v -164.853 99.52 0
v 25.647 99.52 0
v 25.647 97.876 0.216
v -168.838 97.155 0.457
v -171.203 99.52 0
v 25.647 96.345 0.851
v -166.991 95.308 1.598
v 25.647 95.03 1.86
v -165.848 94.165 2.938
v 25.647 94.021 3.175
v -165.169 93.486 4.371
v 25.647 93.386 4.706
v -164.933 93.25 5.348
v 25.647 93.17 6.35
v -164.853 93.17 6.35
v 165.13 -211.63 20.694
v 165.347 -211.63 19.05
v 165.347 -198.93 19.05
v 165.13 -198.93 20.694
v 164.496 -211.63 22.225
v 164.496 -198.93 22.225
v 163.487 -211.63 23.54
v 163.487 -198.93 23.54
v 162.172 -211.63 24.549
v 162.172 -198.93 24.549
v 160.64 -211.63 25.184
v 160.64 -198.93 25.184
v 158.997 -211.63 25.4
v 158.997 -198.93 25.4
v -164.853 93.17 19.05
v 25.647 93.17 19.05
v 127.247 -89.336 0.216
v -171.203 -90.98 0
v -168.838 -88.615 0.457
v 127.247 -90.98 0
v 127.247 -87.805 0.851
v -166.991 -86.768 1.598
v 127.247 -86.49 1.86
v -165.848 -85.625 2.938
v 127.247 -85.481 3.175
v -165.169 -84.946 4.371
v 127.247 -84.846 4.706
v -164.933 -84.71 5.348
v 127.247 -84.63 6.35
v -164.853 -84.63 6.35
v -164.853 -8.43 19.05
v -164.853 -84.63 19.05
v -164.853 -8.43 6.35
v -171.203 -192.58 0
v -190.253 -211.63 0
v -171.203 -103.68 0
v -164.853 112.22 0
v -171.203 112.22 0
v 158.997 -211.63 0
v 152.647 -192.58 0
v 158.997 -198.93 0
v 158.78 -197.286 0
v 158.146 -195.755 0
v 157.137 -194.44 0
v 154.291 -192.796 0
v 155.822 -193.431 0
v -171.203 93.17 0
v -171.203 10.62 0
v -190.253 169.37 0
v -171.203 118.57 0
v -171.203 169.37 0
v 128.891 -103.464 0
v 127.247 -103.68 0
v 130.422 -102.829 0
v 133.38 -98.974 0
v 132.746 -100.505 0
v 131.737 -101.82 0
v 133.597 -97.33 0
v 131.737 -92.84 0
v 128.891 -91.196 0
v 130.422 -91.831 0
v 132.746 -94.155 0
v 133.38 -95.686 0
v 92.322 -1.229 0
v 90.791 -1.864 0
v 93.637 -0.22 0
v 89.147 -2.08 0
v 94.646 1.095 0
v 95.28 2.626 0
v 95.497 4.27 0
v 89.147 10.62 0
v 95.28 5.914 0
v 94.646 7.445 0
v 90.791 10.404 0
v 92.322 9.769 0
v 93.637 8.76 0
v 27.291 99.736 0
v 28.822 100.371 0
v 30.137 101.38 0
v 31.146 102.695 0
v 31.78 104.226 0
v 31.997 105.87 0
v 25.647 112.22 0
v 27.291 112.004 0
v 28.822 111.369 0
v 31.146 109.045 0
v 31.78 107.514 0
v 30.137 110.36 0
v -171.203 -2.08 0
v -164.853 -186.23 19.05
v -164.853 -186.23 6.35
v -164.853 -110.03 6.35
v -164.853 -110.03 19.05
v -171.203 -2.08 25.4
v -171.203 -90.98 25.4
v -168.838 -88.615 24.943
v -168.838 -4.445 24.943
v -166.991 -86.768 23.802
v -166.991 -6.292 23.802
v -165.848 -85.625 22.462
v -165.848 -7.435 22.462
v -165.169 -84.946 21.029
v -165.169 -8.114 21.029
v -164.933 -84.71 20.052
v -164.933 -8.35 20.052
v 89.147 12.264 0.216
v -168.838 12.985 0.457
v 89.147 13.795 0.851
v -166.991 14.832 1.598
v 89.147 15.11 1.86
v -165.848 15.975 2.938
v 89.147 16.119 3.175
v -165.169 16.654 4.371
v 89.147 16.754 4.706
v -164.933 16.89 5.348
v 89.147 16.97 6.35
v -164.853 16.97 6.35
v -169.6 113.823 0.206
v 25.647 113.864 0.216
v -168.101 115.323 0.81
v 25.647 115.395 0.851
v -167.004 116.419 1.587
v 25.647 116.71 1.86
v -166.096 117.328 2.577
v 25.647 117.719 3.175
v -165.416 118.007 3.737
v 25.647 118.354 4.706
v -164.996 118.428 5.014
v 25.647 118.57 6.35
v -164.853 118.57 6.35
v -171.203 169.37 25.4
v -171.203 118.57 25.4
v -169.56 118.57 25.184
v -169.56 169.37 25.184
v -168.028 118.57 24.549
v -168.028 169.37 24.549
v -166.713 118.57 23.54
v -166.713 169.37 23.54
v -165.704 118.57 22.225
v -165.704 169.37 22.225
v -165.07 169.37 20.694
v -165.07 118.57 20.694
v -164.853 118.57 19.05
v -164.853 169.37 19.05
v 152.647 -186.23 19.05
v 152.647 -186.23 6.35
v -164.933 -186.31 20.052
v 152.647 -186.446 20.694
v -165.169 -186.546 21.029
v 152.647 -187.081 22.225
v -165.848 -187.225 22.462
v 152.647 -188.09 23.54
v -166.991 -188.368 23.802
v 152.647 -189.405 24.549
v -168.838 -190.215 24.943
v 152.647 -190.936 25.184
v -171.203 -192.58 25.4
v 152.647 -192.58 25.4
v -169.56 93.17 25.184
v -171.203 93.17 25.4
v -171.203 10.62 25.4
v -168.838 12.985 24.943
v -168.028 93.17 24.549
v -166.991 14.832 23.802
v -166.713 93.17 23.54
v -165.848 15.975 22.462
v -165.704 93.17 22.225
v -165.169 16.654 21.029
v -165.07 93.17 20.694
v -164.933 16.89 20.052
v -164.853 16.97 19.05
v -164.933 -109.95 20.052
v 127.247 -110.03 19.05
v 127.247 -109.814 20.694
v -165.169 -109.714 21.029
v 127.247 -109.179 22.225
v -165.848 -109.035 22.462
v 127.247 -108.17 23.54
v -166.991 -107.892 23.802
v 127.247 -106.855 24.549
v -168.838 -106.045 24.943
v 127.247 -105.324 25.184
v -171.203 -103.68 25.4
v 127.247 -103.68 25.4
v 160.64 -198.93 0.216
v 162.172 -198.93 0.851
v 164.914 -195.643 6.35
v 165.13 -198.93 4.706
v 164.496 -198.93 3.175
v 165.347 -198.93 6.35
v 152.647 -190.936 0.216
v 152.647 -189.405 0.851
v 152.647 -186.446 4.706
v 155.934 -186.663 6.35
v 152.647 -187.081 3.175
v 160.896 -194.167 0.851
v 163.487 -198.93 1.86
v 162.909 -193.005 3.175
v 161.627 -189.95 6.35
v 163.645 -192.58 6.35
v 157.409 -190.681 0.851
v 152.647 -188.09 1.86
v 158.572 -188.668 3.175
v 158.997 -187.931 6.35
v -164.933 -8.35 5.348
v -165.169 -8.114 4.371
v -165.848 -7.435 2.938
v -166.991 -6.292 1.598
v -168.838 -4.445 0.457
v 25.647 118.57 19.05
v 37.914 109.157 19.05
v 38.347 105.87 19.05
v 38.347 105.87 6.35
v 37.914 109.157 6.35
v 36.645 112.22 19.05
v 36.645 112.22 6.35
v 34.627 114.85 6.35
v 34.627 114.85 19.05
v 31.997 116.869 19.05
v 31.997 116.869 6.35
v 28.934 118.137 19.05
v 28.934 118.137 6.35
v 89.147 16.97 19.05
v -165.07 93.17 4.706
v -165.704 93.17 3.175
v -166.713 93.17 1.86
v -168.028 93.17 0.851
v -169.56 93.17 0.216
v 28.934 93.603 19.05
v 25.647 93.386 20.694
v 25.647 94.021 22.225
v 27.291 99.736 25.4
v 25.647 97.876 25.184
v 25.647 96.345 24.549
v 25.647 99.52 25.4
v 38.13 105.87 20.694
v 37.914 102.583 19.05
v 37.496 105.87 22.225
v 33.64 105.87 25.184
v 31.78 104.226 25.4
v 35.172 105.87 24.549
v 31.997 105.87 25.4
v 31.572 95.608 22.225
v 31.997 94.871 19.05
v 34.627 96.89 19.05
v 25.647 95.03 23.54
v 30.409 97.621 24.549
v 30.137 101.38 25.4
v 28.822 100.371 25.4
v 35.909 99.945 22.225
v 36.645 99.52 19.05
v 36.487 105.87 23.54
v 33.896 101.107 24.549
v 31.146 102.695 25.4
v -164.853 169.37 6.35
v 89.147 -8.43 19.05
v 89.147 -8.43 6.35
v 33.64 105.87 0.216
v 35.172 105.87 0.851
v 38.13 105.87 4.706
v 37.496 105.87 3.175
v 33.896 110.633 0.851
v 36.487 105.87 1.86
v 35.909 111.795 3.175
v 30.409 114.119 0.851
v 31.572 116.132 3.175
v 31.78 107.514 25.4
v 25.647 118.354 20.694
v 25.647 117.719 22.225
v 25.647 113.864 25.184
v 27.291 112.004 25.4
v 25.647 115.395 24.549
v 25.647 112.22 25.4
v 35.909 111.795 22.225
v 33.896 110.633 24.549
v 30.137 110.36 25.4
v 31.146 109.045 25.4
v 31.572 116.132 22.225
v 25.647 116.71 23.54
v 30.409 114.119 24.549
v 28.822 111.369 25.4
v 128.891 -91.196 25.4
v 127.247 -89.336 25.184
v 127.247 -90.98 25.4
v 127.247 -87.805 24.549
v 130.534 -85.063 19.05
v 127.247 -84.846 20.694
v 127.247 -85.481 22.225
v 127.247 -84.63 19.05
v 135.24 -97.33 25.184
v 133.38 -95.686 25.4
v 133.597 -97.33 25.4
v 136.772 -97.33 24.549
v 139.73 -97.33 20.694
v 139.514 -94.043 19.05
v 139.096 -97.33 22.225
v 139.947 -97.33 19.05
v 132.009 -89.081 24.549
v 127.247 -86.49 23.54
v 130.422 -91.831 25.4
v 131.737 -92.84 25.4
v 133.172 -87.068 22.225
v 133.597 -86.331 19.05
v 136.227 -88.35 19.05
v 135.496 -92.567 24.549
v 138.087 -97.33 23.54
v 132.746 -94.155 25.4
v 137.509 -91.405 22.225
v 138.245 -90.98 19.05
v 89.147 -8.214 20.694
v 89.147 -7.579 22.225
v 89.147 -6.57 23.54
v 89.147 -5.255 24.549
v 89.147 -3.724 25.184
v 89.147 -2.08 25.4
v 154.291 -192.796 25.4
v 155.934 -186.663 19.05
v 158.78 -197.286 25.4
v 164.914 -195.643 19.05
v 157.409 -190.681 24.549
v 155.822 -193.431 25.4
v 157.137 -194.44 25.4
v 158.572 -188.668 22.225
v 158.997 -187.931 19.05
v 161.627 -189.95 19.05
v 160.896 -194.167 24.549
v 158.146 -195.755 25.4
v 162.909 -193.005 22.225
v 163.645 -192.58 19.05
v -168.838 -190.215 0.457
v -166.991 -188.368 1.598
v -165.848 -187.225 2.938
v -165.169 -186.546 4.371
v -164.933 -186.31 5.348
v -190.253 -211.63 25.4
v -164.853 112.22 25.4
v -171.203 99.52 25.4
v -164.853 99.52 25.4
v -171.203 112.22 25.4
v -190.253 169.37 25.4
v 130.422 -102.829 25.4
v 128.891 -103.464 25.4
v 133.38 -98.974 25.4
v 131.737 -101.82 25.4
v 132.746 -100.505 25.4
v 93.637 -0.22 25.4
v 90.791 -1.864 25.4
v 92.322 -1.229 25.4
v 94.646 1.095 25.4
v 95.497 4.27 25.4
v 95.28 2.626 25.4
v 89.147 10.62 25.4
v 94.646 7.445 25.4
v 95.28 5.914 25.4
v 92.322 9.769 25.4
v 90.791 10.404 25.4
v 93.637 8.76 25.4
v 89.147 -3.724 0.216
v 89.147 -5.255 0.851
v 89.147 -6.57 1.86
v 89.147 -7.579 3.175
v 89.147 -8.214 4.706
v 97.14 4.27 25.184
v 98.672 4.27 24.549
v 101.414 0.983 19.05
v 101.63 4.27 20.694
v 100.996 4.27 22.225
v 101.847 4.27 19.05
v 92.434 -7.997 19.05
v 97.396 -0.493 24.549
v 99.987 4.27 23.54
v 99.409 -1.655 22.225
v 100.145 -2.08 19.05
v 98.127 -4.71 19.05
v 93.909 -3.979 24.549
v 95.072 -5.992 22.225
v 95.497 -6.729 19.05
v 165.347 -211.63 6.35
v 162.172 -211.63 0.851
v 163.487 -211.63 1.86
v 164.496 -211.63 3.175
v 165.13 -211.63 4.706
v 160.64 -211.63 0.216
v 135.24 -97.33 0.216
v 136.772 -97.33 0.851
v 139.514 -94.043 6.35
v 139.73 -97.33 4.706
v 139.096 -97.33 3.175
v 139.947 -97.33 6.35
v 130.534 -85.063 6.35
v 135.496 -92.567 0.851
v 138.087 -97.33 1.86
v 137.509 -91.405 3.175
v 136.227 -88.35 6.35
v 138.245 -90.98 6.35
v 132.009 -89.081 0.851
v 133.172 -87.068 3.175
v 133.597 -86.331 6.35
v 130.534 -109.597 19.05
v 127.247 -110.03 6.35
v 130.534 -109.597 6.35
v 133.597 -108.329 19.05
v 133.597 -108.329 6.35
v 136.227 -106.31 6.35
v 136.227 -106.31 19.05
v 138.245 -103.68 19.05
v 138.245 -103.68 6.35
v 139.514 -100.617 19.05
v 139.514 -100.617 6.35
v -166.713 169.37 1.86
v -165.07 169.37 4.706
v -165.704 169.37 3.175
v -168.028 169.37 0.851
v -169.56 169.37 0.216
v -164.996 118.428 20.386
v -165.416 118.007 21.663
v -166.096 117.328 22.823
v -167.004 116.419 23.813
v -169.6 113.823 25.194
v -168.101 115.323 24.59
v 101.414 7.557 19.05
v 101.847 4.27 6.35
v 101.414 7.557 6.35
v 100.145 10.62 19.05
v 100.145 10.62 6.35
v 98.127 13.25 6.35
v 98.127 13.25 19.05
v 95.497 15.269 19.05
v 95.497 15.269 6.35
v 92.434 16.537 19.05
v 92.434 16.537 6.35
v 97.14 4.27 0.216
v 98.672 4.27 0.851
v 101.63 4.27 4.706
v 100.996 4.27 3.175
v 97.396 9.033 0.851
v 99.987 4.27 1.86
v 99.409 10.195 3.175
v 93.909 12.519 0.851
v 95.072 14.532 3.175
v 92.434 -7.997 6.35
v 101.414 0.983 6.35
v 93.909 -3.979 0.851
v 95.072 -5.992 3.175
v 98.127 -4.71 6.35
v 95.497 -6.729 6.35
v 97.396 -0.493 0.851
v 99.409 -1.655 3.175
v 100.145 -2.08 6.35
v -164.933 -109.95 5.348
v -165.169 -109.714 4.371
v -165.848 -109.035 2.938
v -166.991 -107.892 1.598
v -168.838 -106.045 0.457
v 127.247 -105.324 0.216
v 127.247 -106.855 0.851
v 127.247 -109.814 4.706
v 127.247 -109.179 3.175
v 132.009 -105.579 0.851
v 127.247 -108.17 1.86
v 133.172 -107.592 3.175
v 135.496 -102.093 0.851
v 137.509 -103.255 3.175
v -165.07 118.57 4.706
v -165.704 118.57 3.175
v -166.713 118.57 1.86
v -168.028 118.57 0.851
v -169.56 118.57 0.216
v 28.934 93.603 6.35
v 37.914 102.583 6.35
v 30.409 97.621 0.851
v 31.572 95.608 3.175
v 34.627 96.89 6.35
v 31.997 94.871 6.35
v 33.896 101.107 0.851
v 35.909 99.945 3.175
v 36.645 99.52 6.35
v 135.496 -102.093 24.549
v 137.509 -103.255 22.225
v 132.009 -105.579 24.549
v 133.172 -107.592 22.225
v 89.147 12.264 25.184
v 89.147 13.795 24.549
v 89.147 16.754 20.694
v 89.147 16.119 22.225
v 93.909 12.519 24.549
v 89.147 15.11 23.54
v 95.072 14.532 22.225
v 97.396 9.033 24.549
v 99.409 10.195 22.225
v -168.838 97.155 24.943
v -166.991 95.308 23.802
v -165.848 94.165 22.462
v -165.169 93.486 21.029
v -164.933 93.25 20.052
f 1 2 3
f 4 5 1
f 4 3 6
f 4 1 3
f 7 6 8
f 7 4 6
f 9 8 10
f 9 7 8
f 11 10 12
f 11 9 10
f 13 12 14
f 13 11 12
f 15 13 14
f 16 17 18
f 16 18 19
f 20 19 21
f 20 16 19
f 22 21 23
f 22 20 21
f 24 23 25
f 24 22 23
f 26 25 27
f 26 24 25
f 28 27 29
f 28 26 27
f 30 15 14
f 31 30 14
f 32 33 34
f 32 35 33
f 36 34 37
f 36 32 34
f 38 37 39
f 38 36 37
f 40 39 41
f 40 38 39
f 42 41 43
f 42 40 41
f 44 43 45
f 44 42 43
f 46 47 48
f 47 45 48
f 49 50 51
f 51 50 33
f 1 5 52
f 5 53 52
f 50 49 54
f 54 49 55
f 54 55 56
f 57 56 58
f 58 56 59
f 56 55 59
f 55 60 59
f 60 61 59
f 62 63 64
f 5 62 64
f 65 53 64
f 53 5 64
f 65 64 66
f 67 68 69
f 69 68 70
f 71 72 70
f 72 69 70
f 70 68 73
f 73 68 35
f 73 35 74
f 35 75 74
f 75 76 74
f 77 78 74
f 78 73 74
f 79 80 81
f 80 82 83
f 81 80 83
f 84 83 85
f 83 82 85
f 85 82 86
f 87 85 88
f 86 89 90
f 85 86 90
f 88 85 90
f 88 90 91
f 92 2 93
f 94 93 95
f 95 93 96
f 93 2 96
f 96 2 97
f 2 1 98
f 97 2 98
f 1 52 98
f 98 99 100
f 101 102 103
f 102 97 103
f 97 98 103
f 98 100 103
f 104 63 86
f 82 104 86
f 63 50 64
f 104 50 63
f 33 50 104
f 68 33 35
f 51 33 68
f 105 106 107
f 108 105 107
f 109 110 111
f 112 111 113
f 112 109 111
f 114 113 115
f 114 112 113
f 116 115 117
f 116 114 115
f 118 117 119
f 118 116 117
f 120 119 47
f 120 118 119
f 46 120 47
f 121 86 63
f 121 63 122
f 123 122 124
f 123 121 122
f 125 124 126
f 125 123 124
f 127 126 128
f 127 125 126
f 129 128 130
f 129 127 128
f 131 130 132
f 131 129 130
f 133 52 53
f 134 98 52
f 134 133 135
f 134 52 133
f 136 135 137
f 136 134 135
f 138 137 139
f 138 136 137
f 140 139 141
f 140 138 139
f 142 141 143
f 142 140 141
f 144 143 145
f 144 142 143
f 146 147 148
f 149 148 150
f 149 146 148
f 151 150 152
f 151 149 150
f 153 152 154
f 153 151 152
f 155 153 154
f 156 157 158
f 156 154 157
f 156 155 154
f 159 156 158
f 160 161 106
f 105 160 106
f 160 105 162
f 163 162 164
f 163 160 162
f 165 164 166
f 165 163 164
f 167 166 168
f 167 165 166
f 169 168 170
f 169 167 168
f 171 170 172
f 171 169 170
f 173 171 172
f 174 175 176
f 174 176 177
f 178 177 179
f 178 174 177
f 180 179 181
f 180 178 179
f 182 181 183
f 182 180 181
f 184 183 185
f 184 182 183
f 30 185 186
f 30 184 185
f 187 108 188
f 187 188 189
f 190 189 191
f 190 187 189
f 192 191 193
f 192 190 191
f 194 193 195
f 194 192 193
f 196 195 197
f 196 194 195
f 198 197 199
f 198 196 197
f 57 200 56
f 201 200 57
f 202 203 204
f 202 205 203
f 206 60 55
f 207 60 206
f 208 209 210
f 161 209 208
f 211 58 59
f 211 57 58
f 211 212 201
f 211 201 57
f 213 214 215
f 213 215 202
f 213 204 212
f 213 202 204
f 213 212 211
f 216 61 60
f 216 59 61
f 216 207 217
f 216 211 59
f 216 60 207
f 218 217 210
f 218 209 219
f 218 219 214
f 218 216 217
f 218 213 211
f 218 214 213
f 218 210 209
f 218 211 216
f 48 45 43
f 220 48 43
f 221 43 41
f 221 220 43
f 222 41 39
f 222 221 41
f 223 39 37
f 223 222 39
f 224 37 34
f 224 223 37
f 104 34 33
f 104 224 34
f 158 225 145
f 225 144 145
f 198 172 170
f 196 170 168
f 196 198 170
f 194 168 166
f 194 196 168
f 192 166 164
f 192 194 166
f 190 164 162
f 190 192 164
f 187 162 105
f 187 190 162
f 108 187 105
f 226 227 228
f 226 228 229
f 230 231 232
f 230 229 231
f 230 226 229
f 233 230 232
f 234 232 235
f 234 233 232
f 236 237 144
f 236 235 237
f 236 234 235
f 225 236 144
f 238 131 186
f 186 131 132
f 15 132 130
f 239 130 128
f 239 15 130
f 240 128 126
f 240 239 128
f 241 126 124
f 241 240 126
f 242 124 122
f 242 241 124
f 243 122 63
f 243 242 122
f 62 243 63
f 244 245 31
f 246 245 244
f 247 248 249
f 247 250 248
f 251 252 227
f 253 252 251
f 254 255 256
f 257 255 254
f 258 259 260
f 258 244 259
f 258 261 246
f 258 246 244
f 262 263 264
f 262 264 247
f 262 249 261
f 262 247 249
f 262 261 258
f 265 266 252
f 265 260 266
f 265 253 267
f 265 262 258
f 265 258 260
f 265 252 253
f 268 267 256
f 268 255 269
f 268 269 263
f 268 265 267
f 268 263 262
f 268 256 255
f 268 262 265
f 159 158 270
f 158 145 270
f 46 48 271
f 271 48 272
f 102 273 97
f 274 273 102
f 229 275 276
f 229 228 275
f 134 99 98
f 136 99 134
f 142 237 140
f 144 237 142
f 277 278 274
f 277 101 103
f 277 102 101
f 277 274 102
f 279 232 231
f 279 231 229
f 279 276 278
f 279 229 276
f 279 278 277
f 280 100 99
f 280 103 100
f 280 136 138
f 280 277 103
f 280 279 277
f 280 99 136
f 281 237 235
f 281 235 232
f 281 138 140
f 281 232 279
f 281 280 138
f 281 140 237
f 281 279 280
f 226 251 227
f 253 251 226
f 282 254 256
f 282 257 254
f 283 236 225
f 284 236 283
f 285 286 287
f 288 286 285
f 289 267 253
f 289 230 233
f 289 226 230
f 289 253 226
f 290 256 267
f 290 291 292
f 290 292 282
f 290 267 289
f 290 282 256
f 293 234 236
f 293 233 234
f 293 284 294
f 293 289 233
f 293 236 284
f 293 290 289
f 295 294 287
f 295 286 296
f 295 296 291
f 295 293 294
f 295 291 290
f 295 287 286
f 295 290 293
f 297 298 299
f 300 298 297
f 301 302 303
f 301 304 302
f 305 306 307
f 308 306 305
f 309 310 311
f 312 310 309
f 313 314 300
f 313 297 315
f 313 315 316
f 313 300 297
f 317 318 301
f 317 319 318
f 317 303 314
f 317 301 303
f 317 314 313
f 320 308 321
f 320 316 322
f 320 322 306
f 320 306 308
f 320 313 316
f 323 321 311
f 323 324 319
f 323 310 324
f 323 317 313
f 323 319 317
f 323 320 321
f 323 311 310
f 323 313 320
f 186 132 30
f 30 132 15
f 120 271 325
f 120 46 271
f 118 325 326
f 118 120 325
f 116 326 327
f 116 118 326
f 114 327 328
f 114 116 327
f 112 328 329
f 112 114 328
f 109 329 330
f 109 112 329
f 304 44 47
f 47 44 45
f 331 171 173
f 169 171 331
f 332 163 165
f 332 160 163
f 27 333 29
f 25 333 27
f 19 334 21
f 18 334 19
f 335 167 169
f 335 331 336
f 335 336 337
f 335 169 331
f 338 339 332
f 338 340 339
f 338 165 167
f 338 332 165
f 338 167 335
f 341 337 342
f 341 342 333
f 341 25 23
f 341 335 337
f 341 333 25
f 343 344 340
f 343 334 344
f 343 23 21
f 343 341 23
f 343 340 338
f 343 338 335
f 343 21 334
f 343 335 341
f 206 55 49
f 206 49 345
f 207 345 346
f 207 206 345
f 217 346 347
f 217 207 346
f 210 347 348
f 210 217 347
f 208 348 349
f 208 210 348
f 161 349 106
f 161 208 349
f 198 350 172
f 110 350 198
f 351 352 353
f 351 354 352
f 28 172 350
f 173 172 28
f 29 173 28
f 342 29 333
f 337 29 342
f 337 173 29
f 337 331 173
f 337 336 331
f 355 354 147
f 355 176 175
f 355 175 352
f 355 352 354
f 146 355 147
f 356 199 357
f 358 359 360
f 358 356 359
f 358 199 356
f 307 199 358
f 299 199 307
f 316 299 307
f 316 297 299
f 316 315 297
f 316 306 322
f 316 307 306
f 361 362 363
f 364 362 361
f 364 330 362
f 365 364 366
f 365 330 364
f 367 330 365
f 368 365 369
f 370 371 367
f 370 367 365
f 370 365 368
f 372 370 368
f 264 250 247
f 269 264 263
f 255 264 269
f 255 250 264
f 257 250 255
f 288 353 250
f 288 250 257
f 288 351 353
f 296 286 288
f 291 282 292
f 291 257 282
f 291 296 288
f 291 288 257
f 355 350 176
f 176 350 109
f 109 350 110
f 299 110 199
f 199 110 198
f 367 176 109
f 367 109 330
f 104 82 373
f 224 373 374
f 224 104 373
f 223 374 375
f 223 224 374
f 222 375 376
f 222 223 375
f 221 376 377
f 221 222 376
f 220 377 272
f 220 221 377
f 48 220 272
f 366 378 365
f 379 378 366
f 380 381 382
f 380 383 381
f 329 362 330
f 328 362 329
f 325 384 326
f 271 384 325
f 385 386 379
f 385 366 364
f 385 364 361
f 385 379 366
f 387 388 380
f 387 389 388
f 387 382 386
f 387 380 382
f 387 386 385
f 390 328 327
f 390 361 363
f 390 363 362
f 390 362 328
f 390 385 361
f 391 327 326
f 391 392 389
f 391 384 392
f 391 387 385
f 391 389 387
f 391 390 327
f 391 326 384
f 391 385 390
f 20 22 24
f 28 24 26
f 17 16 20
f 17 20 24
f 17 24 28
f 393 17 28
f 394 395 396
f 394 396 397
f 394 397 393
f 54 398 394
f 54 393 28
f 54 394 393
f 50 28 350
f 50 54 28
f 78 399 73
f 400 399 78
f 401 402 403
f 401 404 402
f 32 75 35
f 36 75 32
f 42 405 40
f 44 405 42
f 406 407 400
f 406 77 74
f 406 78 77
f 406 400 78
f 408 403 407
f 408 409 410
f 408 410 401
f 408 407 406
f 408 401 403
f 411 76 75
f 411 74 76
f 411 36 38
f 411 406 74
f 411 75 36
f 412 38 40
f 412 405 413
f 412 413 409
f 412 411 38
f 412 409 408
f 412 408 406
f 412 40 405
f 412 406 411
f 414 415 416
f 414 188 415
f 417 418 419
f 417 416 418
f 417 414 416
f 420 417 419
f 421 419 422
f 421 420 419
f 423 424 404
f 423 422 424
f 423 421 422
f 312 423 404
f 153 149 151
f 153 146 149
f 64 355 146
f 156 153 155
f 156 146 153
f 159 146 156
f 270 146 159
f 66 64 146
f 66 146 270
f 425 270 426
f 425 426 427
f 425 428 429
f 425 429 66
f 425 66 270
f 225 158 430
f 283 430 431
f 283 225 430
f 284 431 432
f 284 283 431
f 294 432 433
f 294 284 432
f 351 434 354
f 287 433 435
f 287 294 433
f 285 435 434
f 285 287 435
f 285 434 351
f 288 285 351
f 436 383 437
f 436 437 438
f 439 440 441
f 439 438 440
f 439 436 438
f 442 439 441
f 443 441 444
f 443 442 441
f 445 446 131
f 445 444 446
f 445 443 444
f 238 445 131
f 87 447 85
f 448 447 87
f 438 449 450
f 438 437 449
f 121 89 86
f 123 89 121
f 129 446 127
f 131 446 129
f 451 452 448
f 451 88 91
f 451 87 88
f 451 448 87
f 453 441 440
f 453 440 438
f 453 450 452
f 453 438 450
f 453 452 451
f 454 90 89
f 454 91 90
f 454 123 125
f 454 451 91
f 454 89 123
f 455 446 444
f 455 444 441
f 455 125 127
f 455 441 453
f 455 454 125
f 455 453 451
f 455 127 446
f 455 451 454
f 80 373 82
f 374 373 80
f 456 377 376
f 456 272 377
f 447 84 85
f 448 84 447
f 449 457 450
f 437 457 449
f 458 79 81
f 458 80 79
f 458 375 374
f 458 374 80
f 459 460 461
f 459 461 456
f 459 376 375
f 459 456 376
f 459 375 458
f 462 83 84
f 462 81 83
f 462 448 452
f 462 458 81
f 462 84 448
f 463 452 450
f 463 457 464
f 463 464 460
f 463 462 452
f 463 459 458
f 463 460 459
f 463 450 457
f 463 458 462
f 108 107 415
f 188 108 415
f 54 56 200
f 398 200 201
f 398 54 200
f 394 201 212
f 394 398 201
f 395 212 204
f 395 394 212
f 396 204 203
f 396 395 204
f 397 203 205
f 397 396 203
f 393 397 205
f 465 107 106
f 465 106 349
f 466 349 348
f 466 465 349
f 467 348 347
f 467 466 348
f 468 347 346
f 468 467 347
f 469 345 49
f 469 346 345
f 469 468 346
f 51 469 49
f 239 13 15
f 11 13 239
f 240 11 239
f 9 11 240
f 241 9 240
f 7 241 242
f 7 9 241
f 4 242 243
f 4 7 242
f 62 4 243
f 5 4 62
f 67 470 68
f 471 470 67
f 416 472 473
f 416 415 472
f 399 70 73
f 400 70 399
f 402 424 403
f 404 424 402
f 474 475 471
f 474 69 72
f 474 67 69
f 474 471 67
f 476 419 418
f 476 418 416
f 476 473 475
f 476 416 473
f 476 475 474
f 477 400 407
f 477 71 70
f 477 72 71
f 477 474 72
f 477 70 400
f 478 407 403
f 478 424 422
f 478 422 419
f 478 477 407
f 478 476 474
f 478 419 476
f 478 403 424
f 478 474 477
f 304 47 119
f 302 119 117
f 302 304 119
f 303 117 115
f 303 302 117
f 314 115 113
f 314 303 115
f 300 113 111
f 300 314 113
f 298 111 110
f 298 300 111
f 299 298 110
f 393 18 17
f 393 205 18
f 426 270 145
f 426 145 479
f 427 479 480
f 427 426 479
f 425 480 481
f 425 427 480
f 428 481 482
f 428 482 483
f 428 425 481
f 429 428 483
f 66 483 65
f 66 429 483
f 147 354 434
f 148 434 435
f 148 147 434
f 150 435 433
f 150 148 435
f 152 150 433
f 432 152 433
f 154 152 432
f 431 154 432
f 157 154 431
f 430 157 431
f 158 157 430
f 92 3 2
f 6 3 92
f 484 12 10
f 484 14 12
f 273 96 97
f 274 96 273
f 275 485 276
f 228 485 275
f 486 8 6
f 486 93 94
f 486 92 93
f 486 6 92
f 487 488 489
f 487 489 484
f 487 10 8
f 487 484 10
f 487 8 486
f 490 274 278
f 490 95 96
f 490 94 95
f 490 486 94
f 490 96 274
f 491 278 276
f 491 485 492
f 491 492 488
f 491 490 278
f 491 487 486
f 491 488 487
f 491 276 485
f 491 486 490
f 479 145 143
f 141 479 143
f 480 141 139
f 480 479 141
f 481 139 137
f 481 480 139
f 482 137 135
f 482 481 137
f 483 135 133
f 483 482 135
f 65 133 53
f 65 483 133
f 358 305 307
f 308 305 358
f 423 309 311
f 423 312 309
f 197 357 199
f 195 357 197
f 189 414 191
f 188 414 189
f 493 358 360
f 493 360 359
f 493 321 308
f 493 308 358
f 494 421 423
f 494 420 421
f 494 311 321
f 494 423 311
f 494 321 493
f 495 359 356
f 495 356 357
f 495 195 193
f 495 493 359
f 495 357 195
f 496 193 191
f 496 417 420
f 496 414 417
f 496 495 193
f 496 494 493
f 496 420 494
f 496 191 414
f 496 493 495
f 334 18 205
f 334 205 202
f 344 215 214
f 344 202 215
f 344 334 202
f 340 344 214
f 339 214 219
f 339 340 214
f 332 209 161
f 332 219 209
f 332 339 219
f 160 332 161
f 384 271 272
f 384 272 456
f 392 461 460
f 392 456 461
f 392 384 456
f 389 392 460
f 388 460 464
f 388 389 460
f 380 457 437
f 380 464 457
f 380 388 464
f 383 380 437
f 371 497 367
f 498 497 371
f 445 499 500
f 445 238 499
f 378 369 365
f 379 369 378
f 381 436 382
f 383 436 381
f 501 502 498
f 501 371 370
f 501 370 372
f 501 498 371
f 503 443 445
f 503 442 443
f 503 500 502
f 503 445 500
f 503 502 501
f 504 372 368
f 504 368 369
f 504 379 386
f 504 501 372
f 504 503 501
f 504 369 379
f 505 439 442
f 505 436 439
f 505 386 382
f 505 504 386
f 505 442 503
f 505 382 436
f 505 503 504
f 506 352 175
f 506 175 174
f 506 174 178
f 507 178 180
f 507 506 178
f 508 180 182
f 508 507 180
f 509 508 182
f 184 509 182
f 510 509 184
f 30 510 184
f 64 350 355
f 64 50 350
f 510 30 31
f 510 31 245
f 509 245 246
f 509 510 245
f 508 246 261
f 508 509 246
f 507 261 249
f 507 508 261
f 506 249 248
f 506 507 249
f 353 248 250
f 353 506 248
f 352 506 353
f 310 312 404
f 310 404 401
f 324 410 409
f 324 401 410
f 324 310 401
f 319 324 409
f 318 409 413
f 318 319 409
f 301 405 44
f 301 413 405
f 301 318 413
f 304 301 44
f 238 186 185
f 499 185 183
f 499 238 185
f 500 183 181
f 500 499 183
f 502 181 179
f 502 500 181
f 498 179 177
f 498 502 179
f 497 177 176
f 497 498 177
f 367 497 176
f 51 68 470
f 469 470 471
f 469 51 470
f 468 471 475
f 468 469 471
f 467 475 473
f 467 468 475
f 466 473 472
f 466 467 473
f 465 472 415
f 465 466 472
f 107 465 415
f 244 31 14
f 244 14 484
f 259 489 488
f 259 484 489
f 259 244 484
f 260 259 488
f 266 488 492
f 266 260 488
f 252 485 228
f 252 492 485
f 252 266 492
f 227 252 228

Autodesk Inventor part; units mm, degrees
ref_plane "YZ Plane" through (0, 0, 0) normal (1, 0, 0) x (0, 1, 0)
ref_plane "XZ Plane" through (0, 0, 0) normal (0, 1, 0) x (-1, 0, 0)
ref_plane "XY Plane" through (0, 0, 0) normal (0, 0, 1) x (1, 0, 0)
sketch "Sketch1" plane through (0, 0, 0) normal (0, 0, 1) x (1, 0, 0)
  line L0 (-190.2533, 169.37) -> (-164.8533, 169.37)
  line L1 (165.3467, -186.23) -> (165.3467, -211.63)
  line L2 (165.3467, -211.63) -> (-190.2533, -211.63)
  line L3 (-190.2533, -211.63) -> (-190.2533, 169.37)
  line L4 (165.3467, -186.23) -> (-164.8533, -186.23)
  line L5 (-164.8533, -186.23) -> (-164.8533, -110.03)
  line L6 (-164.8533, -110.03) -> (139.9467, -110.03)
  line L7 (139.9467, -84.63) -> (-164.8533, -84.63)
  line L8 (-164.8533, -84.63) -> (-164.8533, -8.43)
  line L9 (-164.8533, -8.43) -> (101.8467, -8.43)
  line L10 (101.8467, -8.43) -> (101.8467, 16.97)
  line L11 (101.8467, 16.97) -> (-164.8533, 16.97)
  line L12 (-164.8533, 16.97) -> (-164.8533, 93.17)
  line L13 (-164.8533, 93.17) -> (38.3467, 93.17)
  line L14 (38.3467, 93.17) -> (38.3467, 118.57)
  line L15 (38.3467, 118.57) -> (-164.8533, 118.57)
  line L16 (-164.8533, 118.57) -> (-164.8533, 169.37)
  line L17 (139.9467, -84.63) -> (139.9467, -110.03)
  point P0 (0, 0)
  dimension "d0" = 381
  dimension "d1" = 355.6
  dimension "d2" = 25.4
  dimension "d3" = 25.4
  dimension "d5" = 25.4
  dimension "d6" = 25.4
  dimension "d7" = 25.4
  dimension "d8" = 76.2
  dimension "d9" = 76.2
  dimension "d10" = 76.2
  dimension "d11" = 203.2
  dimension "d12" = 266.7
  dimension "d13" = 304.8
extrude "Extrusion1" add sketch "Sketch1" along normal blind 25.4
fillet "Fillet1" radius 12.7 5 edges at (165.3467, -186.23, 12.7) (139.9467, -84.63, 12.7) (139.9467, -110.03, 12.7) (101.8467, 16.97, 12.7) (101.8467, -8.43, 12.7)
fillet "Fillet1" radius 12.7 2 edges at (38.3467, 118.57, 12.7) (38.3467, 93.17, 12.7)
fillet "Fillet2" radius 6.35 6 edges at (34.6271, 114.8504, 25.4) (-69.6031, 93.17, 25.4) (-69.6031, 118.57, 25.4) (34.6271, 114.8504, 0) (-69.6031, 93.17, 0) (-69.6031, 118.57, 0)
fillet "Fillet3" radius 6.35 26 edges at (-164.8533, 143.97, 25.4) (-164.8533, 143.97, 0) (-164.8533, 55.07, 25.4) (-164.8533, 55.07, 0) (98.1271, 13.2504, 25.4) (-37.8531, -8.43, 25.4) (-37.8531, 16.97, 25.4) (98.1271, 13.2504, 0) (-37.8531, -8.43, 0) (-37.8531, 16.97, 0) (-164.8533, -46.53, 25.4) (-164.8533, -46.53, 0) (136.2271, -88.3496, 25.4) (-18.8031, -84.63, 25.4) (-18.8031, -110.03, 25.4) (136.2271, -88.3496, 0) (-18.8031, -110.03, 0) (-18.8031, -84.63, 0) (-164.8533, -148.13, 25.4) (-164.8533, -148.13, 0) (161.6271, -189.9496, 25.4) (165.3467, -205.2798, 25.4) (-6.1031, -186.23, 25.4) (161.6271, -189.9496, 0) (165.3467, -205.2798, 0) (-6.1031, -186.23, 0)
properties part number "snowboard rack" material "Wood (Birch)"
